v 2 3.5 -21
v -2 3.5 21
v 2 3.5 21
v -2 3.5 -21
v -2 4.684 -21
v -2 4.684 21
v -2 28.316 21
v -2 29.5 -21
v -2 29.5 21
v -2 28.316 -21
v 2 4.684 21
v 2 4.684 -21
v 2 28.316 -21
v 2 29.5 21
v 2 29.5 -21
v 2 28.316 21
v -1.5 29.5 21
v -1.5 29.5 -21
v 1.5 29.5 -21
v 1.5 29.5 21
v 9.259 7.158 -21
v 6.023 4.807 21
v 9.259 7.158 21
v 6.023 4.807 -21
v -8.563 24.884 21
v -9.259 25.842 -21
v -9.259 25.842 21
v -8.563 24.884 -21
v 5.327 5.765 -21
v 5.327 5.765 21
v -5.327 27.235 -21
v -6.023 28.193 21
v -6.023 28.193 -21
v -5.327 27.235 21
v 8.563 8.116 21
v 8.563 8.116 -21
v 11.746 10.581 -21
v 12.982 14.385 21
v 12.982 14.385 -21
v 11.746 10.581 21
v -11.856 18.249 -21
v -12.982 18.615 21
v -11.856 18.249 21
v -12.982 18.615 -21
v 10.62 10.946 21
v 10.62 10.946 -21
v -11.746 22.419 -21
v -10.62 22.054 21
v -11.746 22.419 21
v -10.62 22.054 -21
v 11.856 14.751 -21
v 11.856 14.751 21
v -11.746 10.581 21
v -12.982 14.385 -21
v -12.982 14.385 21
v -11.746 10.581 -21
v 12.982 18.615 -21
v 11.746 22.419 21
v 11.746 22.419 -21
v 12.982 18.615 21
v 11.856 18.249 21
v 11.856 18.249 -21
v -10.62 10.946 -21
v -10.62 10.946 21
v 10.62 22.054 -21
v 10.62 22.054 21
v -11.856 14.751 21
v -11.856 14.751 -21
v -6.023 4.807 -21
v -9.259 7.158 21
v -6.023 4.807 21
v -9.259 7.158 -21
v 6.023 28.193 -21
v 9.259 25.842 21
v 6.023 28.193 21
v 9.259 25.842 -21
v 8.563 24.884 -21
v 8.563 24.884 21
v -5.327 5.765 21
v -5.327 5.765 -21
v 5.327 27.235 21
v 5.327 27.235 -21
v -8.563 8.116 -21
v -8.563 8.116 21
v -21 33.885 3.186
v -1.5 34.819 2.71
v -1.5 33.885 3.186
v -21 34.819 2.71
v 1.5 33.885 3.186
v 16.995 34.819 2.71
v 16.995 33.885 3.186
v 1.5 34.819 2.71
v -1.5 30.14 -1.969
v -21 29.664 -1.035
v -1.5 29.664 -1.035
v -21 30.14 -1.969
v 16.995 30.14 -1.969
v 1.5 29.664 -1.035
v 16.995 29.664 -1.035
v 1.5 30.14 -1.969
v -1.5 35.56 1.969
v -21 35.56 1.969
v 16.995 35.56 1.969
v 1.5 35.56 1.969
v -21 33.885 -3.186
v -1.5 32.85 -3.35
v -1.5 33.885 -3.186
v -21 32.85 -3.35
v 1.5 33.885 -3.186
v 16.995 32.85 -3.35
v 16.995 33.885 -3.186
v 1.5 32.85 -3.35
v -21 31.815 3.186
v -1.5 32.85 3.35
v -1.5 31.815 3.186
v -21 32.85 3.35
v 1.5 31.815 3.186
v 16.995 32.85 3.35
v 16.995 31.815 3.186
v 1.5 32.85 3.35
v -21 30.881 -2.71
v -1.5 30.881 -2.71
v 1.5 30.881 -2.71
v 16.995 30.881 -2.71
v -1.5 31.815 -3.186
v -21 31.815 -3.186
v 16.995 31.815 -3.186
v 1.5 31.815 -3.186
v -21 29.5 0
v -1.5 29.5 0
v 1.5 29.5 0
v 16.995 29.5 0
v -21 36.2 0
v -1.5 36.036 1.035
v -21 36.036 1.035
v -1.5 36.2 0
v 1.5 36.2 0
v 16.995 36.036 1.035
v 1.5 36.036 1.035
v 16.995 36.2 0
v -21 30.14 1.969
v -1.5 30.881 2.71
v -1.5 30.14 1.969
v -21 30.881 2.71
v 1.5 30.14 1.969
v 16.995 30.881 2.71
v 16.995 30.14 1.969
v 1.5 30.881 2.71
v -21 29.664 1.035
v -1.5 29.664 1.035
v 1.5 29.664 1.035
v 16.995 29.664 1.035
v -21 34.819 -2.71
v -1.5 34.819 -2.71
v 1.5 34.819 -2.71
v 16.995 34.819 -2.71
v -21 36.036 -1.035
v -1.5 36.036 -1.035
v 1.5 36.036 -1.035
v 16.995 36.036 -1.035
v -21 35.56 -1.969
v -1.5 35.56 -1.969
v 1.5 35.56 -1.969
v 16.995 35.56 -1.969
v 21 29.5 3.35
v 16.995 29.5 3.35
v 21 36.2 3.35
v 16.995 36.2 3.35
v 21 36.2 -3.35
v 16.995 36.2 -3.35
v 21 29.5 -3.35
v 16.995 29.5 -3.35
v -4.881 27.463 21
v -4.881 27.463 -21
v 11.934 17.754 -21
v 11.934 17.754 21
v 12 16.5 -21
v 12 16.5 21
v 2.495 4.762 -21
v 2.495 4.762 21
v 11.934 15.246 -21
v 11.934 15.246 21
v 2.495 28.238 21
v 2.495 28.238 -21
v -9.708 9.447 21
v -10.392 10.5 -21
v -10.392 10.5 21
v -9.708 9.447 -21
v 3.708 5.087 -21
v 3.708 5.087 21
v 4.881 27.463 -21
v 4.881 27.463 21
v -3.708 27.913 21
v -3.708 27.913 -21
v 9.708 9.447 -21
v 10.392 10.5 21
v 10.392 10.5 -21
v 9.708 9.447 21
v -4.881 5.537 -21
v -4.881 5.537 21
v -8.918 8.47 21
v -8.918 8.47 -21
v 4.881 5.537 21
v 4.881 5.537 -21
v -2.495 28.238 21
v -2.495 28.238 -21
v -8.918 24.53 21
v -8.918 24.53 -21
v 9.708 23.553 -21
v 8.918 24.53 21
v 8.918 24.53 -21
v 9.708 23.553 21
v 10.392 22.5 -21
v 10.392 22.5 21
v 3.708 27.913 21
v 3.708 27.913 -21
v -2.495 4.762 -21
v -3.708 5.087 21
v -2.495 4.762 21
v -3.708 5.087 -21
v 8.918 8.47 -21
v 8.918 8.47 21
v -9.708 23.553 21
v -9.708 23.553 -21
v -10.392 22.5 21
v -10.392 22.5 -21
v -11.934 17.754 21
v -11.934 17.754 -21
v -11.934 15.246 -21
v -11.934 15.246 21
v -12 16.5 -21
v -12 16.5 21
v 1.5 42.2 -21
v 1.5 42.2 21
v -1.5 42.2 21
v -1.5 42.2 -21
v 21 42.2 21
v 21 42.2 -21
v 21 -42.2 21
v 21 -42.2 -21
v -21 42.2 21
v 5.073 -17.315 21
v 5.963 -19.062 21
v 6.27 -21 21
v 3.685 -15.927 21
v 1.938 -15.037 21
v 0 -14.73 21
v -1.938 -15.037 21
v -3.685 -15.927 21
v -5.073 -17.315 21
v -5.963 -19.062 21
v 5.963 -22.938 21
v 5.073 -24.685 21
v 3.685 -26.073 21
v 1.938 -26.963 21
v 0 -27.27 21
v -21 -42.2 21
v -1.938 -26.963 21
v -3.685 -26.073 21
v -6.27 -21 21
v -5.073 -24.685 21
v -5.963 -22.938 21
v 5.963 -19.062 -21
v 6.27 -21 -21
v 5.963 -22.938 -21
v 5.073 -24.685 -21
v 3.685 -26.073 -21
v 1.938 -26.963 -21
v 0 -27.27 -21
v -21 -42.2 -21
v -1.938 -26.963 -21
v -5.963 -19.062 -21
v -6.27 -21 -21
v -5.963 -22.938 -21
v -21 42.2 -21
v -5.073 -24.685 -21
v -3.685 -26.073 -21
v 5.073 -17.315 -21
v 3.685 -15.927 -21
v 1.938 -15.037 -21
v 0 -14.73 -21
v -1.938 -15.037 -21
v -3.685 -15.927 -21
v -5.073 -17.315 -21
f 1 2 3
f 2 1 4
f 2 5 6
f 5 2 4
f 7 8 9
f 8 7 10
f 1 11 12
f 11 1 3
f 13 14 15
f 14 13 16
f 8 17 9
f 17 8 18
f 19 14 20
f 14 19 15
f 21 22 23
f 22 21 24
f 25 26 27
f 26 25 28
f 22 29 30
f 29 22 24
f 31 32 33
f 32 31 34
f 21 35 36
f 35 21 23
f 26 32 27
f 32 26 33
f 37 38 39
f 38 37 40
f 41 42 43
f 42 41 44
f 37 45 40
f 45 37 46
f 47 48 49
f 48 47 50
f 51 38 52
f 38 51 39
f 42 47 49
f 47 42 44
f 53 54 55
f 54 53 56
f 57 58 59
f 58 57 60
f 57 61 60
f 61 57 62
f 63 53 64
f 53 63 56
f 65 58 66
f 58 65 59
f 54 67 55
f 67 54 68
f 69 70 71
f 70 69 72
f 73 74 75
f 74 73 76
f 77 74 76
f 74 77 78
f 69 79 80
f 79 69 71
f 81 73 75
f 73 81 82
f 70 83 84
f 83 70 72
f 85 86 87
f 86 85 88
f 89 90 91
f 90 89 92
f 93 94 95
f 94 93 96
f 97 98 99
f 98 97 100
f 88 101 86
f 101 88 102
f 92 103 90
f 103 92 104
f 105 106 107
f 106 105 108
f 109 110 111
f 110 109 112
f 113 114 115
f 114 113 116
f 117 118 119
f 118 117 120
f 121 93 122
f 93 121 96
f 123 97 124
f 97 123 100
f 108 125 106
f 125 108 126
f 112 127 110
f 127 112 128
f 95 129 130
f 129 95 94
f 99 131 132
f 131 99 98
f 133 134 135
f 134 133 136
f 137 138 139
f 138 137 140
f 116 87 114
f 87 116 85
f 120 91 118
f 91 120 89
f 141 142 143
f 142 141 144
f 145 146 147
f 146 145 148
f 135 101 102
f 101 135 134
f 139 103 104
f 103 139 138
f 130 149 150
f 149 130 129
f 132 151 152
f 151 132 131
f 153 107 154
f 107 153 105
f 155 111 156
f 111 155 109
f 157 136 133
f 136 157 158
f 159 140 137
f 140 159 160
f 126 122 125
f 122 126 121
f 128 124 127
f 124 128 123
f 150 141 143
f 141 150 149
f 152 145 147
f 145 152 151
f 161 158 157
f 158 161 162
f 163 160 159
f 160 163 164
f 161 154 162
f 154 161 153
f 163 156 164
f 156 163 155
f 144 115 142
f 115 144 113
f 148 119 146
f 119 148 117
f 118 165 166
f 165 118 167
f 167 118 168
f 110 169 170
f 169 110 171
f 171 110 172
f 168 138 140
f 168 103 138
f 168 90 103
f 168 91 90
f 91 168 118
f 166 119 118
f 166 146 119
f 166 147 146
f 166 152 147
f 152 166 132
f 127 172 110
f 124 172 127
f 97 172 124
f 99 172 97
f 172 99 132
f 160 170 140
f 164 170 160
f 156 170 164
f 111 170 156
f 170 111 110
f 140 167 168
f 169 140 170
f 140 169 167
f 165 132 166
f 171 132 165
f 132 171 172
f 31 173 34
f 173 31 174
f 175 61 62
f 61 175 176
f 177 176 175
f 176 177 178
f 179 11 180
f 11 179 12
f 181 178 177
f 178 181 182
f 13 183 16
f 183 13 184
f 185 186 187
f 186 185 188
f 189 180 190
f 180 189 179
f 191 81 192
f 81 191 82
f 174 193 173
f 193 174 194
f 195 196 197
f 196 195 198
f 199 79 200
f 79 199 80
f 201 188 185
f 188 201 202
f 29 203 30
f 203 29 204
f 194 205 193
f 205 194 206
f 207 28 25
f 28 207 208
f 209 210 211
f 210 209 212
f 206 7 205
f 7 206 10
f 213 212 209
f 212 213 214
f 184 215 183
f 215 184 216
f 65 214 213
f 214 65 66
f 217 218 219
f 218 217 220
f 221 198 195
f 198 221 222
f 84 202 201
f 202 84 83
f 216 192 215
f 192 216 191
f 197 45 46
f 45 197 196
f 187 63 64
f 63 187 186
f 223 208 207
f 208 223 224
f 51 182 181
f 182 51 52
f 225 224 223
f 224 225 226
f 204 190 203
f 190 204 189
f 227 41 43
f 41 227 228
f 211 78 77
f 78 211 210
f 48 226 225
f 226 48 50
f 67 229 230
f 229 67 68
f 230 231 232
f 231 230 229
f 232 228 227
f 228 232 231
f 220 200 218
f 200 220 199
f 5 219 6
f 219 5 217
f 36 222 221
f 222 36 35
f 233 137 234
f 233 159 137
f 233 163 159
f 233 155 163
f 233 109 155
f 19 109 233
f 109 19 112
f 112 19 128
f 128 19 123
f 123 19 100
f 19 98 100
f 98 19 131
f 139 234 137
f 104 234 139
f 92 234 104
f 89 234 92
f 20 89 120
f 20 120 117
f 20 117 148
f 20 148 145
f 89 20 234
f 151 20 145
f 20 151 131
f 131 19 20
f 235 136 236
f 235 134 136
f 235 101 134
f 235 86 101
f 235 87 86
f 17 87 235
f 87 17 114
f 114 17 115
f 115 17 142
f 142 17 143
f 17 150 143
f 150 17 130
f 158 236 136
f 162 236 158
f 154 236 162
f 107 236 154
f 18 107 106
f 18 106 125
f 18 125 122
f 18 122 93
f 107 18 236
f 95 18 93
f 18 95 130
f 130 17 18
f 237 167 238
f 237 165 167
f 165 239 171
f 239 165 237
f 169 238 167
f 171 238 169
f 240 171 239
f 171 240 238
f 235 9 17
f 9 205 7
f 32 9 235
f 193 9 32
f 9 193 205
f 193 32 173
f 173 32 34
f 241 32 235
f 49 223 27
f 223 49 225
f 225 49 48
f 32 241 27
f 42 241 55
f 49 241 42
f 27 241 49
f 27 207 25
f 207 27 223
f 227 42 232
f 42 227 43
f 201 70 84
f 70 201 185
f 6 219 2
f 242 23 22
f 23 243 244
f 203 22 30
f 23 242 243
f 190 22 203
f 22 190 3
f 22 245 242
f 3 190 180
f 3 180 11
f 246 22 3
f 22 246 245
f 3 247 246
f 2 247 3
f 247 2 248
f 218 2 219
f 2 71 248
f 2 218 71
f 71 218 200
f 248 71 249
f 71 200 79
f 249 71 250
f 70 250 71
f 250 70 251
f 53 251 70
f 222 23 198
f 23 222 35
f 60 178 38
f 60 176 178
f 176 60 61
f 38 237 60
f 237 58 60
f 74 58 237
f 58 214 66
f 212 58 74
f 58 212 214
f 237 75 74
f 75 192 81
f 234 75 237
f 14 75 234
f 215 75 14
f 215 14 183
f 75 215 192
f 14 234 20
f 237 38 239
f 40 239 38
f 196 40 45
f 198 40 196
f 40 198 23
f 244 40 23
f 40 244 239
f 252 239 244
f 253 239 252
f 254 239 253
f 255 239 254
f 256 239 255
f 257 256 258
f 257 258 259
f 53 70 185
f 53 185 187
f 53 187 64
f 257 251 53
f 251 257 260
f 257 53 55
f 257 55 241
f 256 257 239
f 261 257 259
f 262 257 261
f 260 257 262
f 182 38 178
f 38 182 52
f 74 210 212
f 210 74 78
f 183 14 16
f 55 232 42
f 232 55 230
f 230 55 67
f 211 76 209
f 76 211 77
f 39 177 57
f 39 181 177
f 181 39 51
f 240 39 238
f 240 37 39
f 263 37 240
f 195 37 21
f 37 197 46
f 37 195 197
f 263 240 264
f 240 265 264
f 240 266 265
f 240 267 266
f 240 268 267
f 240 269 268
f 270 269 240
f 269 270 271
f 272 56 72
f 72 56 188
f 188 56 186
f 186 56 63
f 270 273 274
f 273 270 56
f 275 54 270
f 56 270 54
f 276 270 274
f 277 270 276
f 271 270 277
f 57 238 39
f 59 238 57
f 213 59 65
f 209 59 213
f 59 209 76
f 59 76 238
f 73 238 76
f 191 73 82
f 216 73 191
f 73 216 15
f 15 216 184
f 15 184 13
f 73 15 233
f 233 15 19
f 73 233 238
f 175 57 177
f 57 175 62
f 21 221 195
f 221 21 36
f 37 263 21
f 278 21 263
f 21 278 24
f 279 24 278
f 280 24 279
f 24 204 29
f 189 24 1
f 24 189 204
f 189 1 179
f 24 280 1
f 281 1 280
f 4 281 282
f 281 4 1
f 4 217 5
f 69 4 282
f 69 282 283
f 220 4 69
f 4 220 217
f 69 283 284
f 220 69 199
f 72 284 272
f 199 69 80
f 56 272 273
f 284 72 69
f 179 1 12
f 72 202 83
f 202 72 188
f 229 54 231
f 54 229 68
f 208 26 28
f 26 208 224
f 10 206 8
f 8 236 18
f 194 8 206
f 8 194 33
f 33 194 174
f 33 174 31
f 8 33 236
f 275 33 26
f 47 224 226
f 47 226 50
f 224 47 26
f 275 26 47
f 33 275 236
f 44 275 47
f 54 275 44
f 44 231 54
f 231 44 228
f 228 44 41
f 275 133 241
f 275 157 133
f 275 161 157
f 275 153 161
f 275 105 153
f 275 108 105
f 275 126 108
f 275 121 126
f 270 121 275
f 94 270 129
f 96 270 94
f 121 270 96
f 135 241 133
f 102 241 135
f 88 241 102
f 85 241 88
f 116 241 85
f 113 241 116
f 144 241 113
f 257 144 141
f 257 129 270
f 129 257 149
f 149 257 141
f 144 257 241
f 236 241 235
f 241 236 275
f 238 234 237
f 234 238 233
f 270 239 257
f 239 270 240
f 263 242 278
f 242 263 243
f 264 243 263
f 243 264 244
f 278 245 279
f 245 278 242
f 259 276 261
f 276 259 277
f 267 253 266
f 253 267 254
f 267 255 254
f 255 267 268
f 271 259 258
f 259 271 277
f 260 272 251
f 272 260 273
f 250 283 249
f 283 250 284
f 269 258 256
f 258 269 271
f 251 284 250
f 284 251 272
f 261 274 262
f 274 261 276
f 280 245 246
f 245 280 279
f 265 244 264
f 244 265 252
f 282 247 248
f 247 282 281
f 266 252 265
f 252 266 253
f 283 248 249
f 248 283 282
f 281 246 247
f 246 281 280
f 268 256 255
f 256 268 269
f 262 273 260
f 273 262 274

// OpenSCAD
// file: lib/boltDim.scad
/*
    Mounting Blocks to build a camera boom.

    Copyright (C) 2021 John Winans

    This program is free software: you can redistribute it and/or modify
    it under the terms of the GNU General Public License as published by
    the Free Software Foundation, either version 3 of the License, or
    (at your option) any later version.

    This program is distributed in the hope that it will be useful,
    but WITHOUT ANY WARRANTY; without even the implied warranty of
    MERCHANTABILITY or FITNESS FOR A PARTICULAR PURPOSE.  See the
    GNU General Public License for more details.

    You should have received a copy of the GNU General Public License
    along with this program.  If not, see <https://www.gnu.org/licenses/>.
*/

bolt_dim_M2_dia = 3;		// for M2 bolt loose fit
bolt_dim_M2_tap = 2.3;		// for self-tapping a M2 bolt
bolt_dim_M2_head_dia = 4.6;// diameter for a crown countersink

bolt_dim_M25_dia = 3.5;		// for M2.5 bolt loose fit
bolt_dim_M25_tap = 2.6;		// for self-tapping a M2.5 bolt
bolt_dim_M25_head_dia = 6;	// diameter for a crown countersink

bolt_dim_M3_dia = 3.6;		// M3 bolt loose fit
bolt_dim_M3_tap = 3.1;		// for self-tapping M3 bolt
bolt_dim_M3_head_dia = 6.5;	// diameter for a crown countersink

bolt_dim_M5_dia = 5.4;		// for M5 bolt loose fit
bolt_dim_M5_tap = 5;		// for self-tapping a M5 bolt
bolt_dim_M5_head_dia = 9;	// diameter for a crown countersink

nut_dim_M5_DIN985 = 9.6;	// diameter for a hex hole to retain am M5 myloc


bolt_dim_quarter_dia = 6.7;	// for 1/4" bolt loose fit
bolt_dim_quarter_carriage_neck_depth = 4;	// neck length
// file: lib/clamp.scad
/*
	Mounting Blocks to build a camera boom.

    Copyright (C) 2021 John Winans

    This program is free software: you can redistribute it and/or modify
    it under the terms of the GNU General Public License as published by
    the Free Software Foundation, either version 3 of the License, or
    (at your option) any later version.

    This program is distributed in the hope that it will be useful,
    but WITHOUT ANY WARRANTY; without even the implied warranty of
    MERCHANTABILITY or FITNESS FOR A PARTICULAR PURPOSE.  See the
    GNU General Public License for more details.

    You should have received a copy of the GNU General Public License
    along with this program.  If not, see <https://www.gnu.org/licenses/>.
*/

include <boltDim.scad>


//********************************************************
// A pipe & bolt holes for a pipe clamp.
//********************************************************
module clamp_neg(
    relief_slot,        // how far from the edge of the pipe should the relief slot go?
    pipe_length, 
    pipe_diameter,
    clamp_bolt_length,    // used to determine the length of the clamp bolt
    clamp_bolt_dia,
    clamp_bolt_neck_depth,
    clamp_bolt_clearance,
	clamp_bolt_countersink_depth=0,
	clamp_bolt_countersink_dia=0,
    rib=false, 
    stripe=true
    )
{
    clamp_bolt_offset = pipe_diameter/2+clamp_bolt_dia/2+clamp_bolt_clearance;

    cz = pipe_length+.01;
    
    // the pipe hole
    cylinder(d=pipe_diameter, h=cz+.01, center=true, $fn=60);
    
    if (rib)
    {
        // rib it
        rh=2;
        rs=4;
        for (z=[-cz/2+rh*.5+1 : rs : cz/2]) // XXX fudge start to center it
            translate([0,0,z])
                cylinder(d=pipe_diameter+1, h=rh, center=true, $fn=60);
    }
    
    if (stripe)
    {
        // stripe it
        //rh=1.5;
        rh=4;
        rt=360/10;
        for (theta=[90:rt:2690])
            rotate([0,0,theta]) cube([pipe_diameter+2, rh, cz+.01], center=true);
    }
    
    // releif notch
    translate([0,pipe_diameter/2+relief_slot/2,0]) cube([3, relief_slot+.01, cz+.01], center=true);
    
    // clamp bolt
    translate([0,clamp_bolt_offset,0])
    {
        rotate([0,90,0]) 
        cylinder(d=clamp_bolt_dia, h=clamp_bolt_length+.01, $fn=20, center=true);
    
        // square for carriage bolt head
        translate([clamp_bolt_length/2-clamp_bolt_neck_depth/2-clamp_bolt_countersink_depth,0,0])
            cube([clamp_bolt_neck_depth+.01, clamp_bolt_dia,clamp_bolt_dia], center=true);
		translate([clamp_bolt_length/2-clamp_bolt_countersink_depth+.001,0,0])
			rotate([0,90,0]) cylinder(d=clamp_bolt_countersink_dia, h=clamp_bolt_countersink_depth, $fn=30);
    }
}
// main file
/*
    Mounting Blocks to build a camera boom.

    Copyright (C) 2021 John Winans

    This program is free software: you can redistribute it and/or modify
    it under the terms of the GNU General Public License as published by
    the Free Software Foundation, either version 3 of the License, or
    (at your option) any later version.

    This program is distributed in the hope that it will be useful,
    but WITHOUT ANY WARRANTY; without even the implied warranty of
    MERCHANTABILITY or FITNESS FOR A PARTICULAR PURPOSE.  See the
    GNU General Public License for more details.

    You should have received a copy of the GNU General Public License
    along with this program.  If not, see <https://www.gnu.org/licenses/>.
*/

include <lib/clamp.scad>


//********************************************************
// The size of the hole for the pipe(s)
pipe_diameter=24;       // 3/4" conduit

block_c_bolt_pipe_clearance=1;
block_c_bolt_inset=6;	// from clamp-bolt to the end of the block

block_inset=18;			// space from pipe-edge to the block-edge 

pipe_gap=9;				// distance between pipes




// calculate the dimensions of the block using the above config variables

cx = pipe_diameter+block_inset;   

cbd=bolt_dim_quarter_dia;       // clamp bolt diameter
//cz=cbd+block_c_bolt_inset*2;    // this is as thin as I'd want to go
cz=cx;

cbl=cx;                         // length of the clamp bolt bore
cbnd=bolt_dim_quarter_carriage_neck_depth;

cbc=1;
rs=cbd+block_c_bolt_inset+cbc;       // relief slot width

pipe_y = pipe_diameter*2+pipe_gap+rs*2; // mimimum desirable dimension
cy = cx*2 > pipe_y ? cx*2 : pipe_y;



crossblock();


/**
* A helper for creating the negative space for the pipe clamp.
**********************************************************************************/
module cn()
{
    clamp_neg(
        clamp_bolt_length=cbl,
        clamp_bolt_dia=cbd,
        clamp_bolt_neck_depth=cbnd,
        relief_slot=rs,
        pipe_length=cz,
        pipe_diameter=pipe_diameter,
        clamp_bolt_clearance=cbc);
}


/**
* 1/2 bolt Unistrut mount for 3/4 EMT
**********************************************************************************/
module crossblock()
{
	pipe_offset=pipe_diameter/2+pipe_gap/2;

echo(cx);
echo(cy);

    difference()
    {
		cube([cx,cy,cz], center=true);
        translate([0,pipe_offset,0]) cn();
		translate([0,-cx/2,0]) cylinder(d=12.54, h=cz+1, center=true);
    }
}
